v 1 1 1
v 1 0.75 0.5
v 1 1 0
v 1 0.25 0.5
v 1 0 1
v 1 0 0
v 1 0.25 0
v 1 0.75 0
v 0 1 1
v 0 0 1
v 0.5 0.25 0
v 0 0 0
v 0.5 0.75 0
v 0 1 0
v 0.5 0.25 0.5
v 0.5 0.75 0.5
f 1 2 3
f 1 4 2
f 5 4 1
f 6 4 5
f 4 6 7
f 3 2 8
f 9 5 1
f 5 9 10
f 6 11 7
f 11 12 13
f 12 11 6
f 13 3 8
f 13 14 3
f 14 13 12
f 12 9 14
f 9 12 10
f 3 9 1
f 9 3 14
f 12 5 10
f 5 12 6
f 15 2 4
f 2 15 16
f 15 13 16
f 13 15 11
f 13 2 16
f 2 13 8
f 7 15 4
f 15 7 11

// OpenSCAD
difference() {
   cube();
   translate([0.5,0.25,0]) scale(0.5) cube();
}
